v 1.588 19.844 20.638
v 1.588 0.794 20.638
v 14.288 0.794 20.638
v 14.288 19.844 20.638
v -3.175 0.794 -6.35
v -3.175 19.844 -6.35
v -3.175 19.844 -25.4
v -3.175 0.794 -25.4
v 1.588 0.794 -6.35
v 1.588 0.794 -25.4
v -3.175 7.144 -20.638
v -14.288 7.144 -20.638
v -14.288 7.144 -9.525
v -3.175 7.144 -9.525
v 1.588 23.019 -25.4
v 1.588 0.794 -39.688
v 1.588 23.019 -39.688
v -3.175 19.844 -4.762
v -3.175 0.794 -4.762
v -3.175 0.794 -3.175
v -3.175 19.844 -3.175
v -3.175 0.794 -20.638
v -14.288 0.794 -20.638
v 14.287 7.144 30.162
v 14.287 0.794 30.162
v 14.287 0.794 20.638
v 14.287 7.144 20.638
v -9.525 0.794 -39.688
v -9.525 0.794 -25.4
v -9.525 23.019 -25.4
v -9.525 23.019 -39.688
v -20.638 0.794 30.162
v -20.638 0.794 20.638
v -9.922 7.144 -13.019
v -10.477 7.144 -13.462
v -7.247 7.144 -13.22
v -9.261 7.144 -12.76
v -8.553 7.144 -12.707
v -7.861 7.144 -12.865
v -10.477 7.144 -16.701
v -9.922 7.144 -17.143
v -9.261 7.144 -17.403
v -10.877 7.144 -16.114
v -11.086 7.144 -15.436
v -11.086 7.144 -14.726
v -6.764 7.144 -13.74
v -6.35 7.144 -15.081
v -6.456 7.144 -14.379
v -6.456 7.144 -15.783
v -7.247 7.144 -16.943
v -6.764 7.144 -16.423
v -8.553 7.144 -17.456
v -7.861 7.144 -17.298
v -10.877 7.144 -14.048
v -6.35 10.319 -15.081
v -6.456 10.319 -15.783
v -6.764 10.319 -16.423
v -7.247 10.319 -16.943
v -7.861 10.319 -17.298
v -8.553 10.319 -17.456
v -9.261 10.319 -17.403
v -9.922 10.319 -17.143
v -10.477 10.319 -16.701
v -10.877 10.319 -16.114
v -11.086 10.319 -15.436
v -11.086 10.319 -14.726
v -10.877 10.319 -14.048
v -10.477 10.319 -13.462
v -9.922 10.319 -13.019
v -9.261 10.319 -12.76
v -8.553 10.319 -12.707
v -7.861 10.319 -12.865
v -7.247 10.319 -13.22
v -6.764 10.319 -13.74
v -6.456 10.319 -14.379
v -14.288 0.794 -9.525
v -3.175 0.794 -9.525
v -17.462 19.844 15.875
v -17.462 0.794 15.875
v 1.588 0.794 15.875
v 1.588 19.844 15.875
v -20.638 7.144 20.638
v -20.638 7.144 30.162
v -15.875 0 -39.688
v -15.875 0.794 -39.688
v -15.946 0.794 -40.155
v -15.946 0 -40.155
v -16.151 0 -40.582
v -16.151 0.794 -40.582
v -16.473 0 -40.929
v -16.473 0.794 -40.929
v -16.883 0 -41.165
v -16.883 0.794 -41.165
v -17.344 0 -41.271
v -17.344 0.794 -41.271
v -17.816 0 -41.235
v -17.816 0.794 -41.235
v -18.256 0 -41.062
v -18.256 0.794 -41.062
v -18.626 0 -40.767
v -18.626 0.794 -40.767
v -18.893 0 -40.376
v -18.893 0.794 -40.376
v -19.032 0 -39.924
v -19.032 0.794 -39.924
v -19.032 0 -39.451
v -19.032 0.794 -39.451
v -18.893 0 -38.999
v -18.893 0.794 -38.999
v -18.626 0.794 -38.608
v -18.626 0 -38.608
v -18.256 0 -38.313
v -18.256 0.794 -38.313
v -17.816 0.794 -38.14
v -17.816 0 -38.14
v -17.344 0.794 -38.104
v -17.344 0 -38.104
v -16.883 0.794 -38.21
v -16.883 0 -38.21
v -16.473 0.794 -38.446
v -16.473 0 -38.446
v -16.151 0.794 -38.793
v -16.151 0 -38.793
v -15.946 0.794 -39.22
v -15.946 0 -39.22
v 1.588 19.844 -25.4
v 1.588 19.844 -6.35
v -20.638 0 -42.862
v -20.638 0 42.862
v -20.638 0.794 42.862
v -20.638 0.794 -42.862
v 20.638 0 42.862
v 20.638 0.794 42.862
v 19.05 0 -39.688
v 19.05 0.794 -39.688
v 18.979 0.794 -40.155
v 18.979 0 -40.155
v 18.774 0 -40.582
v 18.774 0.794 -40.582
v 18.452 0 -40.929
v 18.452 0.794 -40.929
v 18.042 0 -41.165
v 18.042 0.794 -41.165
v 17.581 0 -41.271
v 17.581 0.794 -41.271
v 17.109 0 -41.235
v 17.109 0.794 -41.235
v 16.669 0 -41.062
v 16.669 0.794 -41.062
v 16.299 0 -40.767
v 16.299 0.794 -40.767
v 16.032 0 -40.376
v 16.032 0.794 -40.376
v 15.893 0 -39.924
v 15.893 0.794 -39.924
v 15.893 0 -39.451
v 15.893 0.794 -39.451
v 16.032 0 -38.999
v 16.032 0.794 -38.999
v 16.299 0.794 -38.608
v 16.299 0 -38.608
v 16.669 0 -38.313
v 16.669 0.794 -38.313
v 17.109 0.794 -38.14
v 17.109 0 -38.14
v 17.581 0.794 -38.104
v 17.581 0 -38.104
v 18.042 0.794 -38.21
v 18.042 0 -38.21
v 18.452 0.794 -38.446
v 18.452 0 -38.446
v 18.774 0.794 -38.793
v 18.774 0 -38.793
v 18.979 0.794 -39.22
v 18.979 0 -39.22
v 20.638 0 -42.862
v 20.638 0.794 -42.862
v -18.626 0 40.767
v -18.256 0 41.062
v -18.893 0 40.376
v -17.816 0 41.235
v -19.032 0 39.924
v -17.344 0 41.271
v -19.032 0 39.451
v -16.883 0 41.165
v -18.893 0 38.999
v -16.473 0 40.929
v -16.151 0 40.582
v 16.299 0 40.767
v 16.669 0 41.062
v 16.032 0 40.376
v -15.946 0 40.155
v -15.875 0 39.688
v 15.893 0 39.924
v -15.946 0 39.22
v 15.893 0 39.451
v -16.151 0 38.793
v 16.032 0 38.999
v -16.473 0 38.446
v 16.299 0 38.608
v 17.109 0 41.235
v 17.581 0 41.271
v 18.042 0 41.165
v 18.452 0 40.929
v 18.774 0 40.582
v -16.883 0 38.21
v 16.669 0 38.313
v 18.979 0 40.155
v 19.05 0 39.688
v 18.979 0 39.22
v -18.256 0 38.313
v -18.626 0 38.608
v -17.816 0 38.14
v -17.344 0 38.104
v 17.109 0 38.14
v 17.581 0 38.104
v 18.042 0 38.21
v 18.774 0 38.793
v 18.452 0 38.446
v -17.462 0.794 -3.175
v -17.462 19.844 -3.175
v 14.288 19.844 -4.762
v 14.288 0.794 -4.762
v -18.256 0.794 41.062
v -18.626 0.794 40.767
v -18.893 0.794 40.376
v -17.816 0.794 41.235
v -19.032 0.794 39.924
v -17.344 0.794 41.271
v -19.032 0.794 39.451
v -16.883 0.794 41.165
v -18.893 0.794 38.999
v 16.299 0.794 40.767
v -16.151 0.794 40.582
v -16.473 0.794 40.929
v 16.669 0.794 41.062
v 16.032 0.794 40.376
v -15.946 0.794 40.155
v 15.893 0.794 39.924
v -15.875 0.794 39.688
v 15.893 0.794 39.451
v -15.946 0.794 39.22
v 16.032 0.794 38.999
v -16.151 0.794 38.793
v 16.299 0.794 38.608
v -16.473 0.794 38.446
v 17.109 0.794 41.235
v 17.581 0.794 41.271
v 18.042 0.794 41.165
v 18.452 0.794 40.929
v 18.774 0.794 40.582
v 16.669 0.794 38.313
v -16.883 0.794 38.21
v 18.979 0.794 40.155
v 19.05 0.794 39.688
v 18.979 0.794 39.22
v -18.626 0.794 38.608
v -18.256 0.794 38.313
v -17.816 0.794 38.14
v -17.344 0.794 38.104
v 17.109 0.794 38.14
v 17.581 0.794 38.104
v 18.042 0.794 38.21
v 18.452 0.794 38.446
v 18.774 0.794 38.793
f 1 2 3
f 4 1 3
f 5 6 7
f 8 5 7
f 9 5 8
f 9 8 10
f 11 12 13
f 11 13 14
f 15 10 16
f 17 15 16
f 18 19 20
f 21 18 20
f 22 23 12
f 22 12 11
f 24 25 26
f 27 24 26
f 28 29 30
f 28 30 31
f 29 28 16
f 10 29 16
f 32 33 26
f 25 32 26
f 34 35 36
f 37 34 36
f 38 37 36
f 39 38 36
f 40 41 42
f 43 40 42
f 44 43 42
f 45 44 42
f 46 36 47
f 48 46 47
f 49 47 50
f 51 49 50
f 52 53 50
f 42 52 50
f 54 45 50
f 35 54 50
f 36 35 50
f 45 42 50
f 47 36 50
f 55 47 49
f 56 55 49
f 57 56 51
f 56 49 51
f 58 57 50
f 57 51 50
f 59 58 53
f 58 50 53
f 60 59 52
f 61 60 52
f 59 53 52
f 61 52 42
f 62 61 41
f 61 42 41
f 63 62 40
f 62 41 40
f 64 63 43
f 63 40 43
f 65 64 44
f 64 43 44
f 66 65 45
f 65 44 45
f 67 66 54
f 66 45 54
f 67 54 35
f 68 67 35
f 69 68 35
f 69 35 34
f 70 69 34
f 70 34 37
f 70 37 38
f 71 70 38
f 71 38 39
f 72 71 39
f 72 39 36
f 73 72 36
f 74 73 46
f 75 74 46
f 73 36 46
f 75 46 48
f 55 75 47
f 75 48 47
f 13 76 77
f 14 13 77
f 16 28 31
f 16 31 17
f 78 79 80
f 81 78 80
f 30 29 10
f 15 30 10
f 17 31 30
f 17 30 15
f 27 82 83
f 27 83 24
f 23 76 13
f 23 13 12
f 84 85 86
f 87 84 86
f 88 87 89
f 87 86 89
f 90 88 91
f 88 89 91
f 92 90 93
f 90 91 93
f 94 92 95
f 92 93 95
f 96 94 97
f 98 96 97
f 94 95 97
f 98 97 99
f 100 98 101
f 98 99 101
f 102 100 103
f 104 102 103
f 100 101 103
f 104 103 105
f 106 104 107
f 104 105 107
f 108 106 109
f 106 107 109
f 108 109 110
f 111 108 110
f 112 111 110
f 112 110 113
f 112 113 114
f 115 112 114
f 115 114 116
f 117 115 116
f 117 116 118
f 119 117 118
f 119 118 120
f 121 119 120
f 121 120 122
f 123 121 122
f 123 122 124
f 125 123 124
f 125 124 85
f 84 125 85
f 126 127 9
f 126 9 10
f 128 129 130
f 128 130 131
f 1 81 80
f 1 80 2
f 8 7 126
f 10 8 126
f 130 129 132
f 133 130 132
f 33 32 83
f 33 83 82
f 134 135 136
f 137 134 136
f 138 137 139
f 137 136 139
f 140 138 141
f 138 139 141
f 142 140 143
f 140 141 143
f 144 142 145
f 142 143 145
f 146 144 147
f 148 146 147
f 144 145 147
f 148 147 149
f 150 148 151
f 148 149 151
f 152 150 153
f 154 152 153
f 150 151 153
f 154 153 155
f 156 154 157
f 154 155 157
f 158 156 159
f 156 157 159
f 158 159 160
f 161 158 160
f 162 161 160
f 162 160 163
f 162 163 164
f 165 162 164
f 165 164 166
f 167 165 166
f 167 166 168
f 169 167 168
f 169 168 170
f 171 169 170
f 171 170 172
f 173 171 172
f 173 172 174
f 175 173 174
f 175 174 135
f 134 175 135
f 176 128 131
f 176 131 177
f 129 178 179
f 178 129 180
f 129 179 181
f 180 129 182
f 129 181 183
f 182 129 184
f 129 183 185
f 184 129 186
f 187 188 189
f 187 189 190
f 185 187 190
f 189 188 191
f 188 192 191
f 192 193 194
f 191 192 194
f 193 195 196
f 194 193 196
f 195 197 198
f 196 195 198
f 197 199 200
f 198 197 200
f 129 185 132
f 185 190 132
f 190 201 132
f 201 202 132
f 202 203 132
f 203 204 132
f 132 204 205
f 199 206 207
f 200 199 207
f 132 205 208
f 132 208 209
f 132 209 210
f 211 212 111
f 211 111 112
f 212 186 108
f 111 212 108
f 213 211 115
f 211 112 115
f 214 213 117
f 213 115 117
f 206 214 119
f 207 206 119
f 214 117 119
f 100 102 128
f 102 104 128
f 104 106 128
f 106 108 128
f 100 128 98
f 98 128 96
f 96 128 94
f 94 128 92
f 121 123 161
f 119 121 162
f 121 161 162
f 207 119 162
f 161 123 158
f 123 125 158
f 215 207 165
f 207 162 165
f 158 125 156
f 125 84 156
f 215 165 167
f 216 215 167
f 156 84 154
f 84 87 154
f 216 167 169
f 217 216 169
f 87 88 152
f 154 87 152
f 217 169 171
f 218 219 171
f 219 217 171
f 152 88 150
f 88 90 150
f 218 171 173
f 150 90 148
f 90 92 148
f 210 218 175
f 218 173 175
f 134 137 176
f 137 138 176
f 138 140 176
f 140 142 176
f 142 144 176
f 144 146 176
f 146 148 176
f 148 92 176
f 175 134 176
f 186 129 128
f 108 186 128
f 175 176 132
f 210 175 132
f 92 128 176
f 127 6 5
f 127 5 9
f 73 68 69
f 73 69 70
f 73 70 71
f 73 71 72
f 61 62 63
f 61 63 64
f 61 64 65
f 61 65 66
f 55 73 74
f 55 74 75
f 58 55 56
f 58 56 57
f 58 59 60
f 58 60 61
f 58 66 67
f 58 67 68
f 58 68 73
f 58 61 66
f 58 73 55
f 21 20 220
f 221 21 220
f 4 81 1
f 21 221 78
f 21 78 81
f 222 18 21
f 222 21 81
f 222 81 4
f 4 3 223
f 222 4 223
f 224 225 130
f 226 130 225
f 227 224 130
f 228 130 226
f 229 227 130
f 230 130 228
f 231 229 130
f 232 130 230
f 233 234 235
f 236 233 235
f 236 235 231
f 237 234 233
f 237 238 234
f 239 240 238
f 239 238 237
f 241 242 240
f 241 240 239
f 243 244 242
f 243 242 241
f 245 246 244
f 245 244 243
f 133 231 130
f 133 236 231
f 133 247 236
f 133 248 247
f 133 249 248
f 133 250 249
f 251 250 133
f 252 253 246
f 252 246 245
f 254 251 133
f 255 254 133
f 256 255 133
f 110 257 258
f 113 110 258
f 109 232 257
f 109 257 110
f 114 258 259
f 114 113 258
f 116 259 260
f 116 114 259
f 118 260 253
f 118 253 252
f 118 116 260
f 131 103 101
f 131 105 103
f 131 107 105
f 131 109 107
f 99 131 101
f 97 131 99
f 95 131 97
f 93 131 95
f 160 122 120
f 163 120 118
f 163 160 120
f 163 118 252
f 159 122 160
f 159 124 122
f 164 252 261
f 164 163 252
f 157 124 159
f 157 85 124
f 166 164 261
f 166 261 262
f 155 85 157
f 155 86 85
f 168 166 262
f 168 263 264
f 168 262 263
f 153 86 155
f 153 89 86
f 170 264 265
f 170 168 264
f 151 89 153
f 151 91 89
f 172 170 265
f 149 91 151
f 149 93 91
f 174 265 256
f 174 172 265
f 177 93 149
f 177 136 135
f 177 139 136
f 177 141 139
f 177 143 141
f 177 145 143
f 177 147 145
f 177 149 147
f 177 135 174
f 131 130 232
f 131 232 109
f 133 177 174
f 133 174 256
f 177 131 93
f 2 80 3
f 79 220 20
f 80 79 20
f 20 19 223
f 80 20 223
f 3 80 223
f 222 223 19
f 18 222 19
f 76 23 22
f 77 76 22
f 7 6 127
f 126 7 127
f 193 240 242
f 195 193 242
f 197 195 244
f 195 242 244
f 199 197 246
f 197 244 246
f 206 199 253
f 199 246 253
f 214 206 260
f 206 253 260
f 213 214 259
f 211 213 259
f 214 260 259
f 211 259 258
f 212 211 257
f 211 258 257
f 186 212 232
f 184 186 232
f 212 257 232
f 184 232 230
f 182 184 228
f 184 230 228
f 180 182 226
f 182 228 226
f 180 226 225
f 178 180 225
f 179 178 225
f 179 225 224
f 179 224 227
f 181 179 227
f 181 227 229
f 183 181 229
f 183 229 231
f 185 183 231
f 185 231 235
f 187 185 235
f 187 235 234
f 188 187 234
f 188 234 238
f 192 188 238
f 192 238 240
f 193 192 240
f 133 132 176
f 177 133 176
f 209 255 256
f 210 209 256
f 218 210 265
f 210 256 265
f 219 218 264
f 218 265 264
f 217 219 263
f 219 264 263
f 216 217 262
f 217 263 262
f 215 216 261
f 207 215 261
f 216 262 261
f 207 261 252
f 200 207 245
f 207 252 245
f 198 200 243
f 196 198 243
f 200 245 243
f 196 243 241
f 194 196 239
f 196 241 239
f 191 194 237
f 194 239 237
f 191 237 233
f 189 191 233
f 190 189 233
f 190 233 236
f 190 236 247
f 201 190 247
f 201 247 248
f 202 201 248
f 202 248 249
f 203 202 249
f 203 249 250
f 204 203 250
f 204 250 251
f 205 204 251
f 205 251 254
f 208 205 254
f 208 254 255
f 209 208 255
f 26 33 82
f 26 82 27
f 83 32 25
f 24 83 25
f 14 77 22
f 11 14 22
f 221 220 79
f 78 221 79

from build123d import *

# Parameters (mm, degrees)
SKETCH1_W           = 41.275
SKETCH1_H           = 85.725
BOSS_EXTRUDE1_DEPTH = 0.79375
SKETCH2_W           = 34.925
SKETCH2_H           = 9.525
BOSS_EXTRUDE2_DEPTH = 6.35
BOSS_EXTRUDE3_DEPTH = 19.05
SKETCH4_W           = 11.1125
SKETCH4_H           = 11.1125
BOSS_EXTRUDE4_DEPTH = 6.35
SKETCH5_R           = 2.38125
BOSS_EXTRUDE5_DEPTH = 3.175
SKETCH6_W           = 4.7625
SKETCH6_H           = 19.05
BOSS_EXTRUDE6_DEPTH = 19.05
SKETCH7_W           = 11.1125
SKETCH7_H           = 14.2875
BOSS_EXTRUDE7_DEPTH = 22.225
SKETCH8_R           = 1.5875
CUT_EXTRUDE1_DEPTH  = 1.79375


with BuildPart() as part:
    # Sketch1 → Boss-Extrude1 (new body)
    with BuildSketch(Plane(origin=(0, 0, 0), x_dir=(1, 0, 0), z_dir=(0, 1, 0))):
        Rectangle(SKETCH1_W, SKETCH1_H)
    extrude(amount=BOSS_EXTRUDE1_DEPTH)

    # Sketch8 → Cut-Extrude1 (cut, through all)
    with BuildSketch(Plane(origin=(0, 0.79375, 0), x_dir=(1, 0, 0), z_dir=(0, 1, 0))):
        with Locations((-17.4625, 39.6875)):
            Circle(SKETCH8_R)
        with Locations((17.4625, 39.6875)):
            Circle(SKETCH8_R)
        with Locations((-17.4625, -39.6875)):
            Circle(SKETCH8_R)
        with Locations((17.4625, -39.6875)):
            Circle(SKETCH8_R)
    extrude(amount=-CUT_EXTRUDE1_DEPTH, mode=Mode.SUBTRACT)


with BuildPart() as body_2:
    # Sketch2 → Boss-Extrude2 (new body)
    with BuildSketch(Plane(origin=(0, 0.79375, 0), x_dir=(1, 0, 0), z_dir=(0, 1, 0))):
        with Locations((-3.175, -25.4)):
            Rectangle(SKETCH2_W, SKETCH2_H)
    extrude(amount=BOSS_EXTRUDE2_DEPTH)


with BuildPart() as body_3:
    # Sketch3 → Boss-Extrude3 (new body)
    with BuildSketch(Plane(origin=(0, 0.79375, 0), x_dir=(1, 0, 0), z_dir=(0, 1, 0))):
        Polygon((14.2875, -20.6375), (14.2875, 4.7625), (-3.175, 4.7625), (-3.175, 3.175), (-17.4625, 3.175), (-17.4625, -15.875), (1.5875, -15.875), (1.5875, -20.6375), align=None)
    extrude(amount=BOSS_EXTRUDE3_DEPTH)


with BuildPart() as body_4:
    # Sketch4 → Boss-Extrude4 (new body)
    with BuildSketch(Plane(origin=(0, 0.79375, 0), x_dir=(1, 0, 0), z_dir=(0, 1, 0))):
        with Locations((-8.73125, 15.08125)):
            Rectangle(SKETCH4_W, SKETCH4_H)
    extrude(amount=BOSS_EXTRUDE4_DEPTH)


with BuildPart() as body_5:
    # Sketch5 → Boss-Extrude5 (new body)
    with BuildSketch(Plane(origin=(0, 7.14375, 0), x_dir=(1, 0, 0), z_dir=(0, 1, 0))):
        with Locations((-8.73125, 15.08125)):
            Circle(SKETCH5_R)
    extrude(amount=BOSS_EXTRUDE5_DEPTH)


with BuildPart() as body_6:
    # Sketch6 → Boss-Extrude6 (new body)
    with BuildSketch(Plane(origin=(0, 0.79375, 0), x_dir=(1, 0, 0), z_dir=(0, 1, 0))):
        with Locations((-0.79375, 15.875)):
            Rectangle(SKETCH6_W, SKETCH6_H)
    extrude(amount=BOSS_EXTRUDE6_DEPTH)


with BuildPart() as body_7:
    # Sketch7 → Boss-Extrude7 (new body)
    with BuildSketch(Plane(origin=(0, 0.79375, 0), x_dir=(1, 0, 0), z_dir=(0, 1, 0))):
        with Locations((-3.96875, 32.54375)):
            Rectangle(SKETCH7_W, SKETCH7_H)
    extrude(amount=BOSS_EXTRUDE7_DEPTH)


solid = Compound([part.part, body_2.part, body_3.part, body_4.part, body_5.part, body_6.part, body_7.part])
